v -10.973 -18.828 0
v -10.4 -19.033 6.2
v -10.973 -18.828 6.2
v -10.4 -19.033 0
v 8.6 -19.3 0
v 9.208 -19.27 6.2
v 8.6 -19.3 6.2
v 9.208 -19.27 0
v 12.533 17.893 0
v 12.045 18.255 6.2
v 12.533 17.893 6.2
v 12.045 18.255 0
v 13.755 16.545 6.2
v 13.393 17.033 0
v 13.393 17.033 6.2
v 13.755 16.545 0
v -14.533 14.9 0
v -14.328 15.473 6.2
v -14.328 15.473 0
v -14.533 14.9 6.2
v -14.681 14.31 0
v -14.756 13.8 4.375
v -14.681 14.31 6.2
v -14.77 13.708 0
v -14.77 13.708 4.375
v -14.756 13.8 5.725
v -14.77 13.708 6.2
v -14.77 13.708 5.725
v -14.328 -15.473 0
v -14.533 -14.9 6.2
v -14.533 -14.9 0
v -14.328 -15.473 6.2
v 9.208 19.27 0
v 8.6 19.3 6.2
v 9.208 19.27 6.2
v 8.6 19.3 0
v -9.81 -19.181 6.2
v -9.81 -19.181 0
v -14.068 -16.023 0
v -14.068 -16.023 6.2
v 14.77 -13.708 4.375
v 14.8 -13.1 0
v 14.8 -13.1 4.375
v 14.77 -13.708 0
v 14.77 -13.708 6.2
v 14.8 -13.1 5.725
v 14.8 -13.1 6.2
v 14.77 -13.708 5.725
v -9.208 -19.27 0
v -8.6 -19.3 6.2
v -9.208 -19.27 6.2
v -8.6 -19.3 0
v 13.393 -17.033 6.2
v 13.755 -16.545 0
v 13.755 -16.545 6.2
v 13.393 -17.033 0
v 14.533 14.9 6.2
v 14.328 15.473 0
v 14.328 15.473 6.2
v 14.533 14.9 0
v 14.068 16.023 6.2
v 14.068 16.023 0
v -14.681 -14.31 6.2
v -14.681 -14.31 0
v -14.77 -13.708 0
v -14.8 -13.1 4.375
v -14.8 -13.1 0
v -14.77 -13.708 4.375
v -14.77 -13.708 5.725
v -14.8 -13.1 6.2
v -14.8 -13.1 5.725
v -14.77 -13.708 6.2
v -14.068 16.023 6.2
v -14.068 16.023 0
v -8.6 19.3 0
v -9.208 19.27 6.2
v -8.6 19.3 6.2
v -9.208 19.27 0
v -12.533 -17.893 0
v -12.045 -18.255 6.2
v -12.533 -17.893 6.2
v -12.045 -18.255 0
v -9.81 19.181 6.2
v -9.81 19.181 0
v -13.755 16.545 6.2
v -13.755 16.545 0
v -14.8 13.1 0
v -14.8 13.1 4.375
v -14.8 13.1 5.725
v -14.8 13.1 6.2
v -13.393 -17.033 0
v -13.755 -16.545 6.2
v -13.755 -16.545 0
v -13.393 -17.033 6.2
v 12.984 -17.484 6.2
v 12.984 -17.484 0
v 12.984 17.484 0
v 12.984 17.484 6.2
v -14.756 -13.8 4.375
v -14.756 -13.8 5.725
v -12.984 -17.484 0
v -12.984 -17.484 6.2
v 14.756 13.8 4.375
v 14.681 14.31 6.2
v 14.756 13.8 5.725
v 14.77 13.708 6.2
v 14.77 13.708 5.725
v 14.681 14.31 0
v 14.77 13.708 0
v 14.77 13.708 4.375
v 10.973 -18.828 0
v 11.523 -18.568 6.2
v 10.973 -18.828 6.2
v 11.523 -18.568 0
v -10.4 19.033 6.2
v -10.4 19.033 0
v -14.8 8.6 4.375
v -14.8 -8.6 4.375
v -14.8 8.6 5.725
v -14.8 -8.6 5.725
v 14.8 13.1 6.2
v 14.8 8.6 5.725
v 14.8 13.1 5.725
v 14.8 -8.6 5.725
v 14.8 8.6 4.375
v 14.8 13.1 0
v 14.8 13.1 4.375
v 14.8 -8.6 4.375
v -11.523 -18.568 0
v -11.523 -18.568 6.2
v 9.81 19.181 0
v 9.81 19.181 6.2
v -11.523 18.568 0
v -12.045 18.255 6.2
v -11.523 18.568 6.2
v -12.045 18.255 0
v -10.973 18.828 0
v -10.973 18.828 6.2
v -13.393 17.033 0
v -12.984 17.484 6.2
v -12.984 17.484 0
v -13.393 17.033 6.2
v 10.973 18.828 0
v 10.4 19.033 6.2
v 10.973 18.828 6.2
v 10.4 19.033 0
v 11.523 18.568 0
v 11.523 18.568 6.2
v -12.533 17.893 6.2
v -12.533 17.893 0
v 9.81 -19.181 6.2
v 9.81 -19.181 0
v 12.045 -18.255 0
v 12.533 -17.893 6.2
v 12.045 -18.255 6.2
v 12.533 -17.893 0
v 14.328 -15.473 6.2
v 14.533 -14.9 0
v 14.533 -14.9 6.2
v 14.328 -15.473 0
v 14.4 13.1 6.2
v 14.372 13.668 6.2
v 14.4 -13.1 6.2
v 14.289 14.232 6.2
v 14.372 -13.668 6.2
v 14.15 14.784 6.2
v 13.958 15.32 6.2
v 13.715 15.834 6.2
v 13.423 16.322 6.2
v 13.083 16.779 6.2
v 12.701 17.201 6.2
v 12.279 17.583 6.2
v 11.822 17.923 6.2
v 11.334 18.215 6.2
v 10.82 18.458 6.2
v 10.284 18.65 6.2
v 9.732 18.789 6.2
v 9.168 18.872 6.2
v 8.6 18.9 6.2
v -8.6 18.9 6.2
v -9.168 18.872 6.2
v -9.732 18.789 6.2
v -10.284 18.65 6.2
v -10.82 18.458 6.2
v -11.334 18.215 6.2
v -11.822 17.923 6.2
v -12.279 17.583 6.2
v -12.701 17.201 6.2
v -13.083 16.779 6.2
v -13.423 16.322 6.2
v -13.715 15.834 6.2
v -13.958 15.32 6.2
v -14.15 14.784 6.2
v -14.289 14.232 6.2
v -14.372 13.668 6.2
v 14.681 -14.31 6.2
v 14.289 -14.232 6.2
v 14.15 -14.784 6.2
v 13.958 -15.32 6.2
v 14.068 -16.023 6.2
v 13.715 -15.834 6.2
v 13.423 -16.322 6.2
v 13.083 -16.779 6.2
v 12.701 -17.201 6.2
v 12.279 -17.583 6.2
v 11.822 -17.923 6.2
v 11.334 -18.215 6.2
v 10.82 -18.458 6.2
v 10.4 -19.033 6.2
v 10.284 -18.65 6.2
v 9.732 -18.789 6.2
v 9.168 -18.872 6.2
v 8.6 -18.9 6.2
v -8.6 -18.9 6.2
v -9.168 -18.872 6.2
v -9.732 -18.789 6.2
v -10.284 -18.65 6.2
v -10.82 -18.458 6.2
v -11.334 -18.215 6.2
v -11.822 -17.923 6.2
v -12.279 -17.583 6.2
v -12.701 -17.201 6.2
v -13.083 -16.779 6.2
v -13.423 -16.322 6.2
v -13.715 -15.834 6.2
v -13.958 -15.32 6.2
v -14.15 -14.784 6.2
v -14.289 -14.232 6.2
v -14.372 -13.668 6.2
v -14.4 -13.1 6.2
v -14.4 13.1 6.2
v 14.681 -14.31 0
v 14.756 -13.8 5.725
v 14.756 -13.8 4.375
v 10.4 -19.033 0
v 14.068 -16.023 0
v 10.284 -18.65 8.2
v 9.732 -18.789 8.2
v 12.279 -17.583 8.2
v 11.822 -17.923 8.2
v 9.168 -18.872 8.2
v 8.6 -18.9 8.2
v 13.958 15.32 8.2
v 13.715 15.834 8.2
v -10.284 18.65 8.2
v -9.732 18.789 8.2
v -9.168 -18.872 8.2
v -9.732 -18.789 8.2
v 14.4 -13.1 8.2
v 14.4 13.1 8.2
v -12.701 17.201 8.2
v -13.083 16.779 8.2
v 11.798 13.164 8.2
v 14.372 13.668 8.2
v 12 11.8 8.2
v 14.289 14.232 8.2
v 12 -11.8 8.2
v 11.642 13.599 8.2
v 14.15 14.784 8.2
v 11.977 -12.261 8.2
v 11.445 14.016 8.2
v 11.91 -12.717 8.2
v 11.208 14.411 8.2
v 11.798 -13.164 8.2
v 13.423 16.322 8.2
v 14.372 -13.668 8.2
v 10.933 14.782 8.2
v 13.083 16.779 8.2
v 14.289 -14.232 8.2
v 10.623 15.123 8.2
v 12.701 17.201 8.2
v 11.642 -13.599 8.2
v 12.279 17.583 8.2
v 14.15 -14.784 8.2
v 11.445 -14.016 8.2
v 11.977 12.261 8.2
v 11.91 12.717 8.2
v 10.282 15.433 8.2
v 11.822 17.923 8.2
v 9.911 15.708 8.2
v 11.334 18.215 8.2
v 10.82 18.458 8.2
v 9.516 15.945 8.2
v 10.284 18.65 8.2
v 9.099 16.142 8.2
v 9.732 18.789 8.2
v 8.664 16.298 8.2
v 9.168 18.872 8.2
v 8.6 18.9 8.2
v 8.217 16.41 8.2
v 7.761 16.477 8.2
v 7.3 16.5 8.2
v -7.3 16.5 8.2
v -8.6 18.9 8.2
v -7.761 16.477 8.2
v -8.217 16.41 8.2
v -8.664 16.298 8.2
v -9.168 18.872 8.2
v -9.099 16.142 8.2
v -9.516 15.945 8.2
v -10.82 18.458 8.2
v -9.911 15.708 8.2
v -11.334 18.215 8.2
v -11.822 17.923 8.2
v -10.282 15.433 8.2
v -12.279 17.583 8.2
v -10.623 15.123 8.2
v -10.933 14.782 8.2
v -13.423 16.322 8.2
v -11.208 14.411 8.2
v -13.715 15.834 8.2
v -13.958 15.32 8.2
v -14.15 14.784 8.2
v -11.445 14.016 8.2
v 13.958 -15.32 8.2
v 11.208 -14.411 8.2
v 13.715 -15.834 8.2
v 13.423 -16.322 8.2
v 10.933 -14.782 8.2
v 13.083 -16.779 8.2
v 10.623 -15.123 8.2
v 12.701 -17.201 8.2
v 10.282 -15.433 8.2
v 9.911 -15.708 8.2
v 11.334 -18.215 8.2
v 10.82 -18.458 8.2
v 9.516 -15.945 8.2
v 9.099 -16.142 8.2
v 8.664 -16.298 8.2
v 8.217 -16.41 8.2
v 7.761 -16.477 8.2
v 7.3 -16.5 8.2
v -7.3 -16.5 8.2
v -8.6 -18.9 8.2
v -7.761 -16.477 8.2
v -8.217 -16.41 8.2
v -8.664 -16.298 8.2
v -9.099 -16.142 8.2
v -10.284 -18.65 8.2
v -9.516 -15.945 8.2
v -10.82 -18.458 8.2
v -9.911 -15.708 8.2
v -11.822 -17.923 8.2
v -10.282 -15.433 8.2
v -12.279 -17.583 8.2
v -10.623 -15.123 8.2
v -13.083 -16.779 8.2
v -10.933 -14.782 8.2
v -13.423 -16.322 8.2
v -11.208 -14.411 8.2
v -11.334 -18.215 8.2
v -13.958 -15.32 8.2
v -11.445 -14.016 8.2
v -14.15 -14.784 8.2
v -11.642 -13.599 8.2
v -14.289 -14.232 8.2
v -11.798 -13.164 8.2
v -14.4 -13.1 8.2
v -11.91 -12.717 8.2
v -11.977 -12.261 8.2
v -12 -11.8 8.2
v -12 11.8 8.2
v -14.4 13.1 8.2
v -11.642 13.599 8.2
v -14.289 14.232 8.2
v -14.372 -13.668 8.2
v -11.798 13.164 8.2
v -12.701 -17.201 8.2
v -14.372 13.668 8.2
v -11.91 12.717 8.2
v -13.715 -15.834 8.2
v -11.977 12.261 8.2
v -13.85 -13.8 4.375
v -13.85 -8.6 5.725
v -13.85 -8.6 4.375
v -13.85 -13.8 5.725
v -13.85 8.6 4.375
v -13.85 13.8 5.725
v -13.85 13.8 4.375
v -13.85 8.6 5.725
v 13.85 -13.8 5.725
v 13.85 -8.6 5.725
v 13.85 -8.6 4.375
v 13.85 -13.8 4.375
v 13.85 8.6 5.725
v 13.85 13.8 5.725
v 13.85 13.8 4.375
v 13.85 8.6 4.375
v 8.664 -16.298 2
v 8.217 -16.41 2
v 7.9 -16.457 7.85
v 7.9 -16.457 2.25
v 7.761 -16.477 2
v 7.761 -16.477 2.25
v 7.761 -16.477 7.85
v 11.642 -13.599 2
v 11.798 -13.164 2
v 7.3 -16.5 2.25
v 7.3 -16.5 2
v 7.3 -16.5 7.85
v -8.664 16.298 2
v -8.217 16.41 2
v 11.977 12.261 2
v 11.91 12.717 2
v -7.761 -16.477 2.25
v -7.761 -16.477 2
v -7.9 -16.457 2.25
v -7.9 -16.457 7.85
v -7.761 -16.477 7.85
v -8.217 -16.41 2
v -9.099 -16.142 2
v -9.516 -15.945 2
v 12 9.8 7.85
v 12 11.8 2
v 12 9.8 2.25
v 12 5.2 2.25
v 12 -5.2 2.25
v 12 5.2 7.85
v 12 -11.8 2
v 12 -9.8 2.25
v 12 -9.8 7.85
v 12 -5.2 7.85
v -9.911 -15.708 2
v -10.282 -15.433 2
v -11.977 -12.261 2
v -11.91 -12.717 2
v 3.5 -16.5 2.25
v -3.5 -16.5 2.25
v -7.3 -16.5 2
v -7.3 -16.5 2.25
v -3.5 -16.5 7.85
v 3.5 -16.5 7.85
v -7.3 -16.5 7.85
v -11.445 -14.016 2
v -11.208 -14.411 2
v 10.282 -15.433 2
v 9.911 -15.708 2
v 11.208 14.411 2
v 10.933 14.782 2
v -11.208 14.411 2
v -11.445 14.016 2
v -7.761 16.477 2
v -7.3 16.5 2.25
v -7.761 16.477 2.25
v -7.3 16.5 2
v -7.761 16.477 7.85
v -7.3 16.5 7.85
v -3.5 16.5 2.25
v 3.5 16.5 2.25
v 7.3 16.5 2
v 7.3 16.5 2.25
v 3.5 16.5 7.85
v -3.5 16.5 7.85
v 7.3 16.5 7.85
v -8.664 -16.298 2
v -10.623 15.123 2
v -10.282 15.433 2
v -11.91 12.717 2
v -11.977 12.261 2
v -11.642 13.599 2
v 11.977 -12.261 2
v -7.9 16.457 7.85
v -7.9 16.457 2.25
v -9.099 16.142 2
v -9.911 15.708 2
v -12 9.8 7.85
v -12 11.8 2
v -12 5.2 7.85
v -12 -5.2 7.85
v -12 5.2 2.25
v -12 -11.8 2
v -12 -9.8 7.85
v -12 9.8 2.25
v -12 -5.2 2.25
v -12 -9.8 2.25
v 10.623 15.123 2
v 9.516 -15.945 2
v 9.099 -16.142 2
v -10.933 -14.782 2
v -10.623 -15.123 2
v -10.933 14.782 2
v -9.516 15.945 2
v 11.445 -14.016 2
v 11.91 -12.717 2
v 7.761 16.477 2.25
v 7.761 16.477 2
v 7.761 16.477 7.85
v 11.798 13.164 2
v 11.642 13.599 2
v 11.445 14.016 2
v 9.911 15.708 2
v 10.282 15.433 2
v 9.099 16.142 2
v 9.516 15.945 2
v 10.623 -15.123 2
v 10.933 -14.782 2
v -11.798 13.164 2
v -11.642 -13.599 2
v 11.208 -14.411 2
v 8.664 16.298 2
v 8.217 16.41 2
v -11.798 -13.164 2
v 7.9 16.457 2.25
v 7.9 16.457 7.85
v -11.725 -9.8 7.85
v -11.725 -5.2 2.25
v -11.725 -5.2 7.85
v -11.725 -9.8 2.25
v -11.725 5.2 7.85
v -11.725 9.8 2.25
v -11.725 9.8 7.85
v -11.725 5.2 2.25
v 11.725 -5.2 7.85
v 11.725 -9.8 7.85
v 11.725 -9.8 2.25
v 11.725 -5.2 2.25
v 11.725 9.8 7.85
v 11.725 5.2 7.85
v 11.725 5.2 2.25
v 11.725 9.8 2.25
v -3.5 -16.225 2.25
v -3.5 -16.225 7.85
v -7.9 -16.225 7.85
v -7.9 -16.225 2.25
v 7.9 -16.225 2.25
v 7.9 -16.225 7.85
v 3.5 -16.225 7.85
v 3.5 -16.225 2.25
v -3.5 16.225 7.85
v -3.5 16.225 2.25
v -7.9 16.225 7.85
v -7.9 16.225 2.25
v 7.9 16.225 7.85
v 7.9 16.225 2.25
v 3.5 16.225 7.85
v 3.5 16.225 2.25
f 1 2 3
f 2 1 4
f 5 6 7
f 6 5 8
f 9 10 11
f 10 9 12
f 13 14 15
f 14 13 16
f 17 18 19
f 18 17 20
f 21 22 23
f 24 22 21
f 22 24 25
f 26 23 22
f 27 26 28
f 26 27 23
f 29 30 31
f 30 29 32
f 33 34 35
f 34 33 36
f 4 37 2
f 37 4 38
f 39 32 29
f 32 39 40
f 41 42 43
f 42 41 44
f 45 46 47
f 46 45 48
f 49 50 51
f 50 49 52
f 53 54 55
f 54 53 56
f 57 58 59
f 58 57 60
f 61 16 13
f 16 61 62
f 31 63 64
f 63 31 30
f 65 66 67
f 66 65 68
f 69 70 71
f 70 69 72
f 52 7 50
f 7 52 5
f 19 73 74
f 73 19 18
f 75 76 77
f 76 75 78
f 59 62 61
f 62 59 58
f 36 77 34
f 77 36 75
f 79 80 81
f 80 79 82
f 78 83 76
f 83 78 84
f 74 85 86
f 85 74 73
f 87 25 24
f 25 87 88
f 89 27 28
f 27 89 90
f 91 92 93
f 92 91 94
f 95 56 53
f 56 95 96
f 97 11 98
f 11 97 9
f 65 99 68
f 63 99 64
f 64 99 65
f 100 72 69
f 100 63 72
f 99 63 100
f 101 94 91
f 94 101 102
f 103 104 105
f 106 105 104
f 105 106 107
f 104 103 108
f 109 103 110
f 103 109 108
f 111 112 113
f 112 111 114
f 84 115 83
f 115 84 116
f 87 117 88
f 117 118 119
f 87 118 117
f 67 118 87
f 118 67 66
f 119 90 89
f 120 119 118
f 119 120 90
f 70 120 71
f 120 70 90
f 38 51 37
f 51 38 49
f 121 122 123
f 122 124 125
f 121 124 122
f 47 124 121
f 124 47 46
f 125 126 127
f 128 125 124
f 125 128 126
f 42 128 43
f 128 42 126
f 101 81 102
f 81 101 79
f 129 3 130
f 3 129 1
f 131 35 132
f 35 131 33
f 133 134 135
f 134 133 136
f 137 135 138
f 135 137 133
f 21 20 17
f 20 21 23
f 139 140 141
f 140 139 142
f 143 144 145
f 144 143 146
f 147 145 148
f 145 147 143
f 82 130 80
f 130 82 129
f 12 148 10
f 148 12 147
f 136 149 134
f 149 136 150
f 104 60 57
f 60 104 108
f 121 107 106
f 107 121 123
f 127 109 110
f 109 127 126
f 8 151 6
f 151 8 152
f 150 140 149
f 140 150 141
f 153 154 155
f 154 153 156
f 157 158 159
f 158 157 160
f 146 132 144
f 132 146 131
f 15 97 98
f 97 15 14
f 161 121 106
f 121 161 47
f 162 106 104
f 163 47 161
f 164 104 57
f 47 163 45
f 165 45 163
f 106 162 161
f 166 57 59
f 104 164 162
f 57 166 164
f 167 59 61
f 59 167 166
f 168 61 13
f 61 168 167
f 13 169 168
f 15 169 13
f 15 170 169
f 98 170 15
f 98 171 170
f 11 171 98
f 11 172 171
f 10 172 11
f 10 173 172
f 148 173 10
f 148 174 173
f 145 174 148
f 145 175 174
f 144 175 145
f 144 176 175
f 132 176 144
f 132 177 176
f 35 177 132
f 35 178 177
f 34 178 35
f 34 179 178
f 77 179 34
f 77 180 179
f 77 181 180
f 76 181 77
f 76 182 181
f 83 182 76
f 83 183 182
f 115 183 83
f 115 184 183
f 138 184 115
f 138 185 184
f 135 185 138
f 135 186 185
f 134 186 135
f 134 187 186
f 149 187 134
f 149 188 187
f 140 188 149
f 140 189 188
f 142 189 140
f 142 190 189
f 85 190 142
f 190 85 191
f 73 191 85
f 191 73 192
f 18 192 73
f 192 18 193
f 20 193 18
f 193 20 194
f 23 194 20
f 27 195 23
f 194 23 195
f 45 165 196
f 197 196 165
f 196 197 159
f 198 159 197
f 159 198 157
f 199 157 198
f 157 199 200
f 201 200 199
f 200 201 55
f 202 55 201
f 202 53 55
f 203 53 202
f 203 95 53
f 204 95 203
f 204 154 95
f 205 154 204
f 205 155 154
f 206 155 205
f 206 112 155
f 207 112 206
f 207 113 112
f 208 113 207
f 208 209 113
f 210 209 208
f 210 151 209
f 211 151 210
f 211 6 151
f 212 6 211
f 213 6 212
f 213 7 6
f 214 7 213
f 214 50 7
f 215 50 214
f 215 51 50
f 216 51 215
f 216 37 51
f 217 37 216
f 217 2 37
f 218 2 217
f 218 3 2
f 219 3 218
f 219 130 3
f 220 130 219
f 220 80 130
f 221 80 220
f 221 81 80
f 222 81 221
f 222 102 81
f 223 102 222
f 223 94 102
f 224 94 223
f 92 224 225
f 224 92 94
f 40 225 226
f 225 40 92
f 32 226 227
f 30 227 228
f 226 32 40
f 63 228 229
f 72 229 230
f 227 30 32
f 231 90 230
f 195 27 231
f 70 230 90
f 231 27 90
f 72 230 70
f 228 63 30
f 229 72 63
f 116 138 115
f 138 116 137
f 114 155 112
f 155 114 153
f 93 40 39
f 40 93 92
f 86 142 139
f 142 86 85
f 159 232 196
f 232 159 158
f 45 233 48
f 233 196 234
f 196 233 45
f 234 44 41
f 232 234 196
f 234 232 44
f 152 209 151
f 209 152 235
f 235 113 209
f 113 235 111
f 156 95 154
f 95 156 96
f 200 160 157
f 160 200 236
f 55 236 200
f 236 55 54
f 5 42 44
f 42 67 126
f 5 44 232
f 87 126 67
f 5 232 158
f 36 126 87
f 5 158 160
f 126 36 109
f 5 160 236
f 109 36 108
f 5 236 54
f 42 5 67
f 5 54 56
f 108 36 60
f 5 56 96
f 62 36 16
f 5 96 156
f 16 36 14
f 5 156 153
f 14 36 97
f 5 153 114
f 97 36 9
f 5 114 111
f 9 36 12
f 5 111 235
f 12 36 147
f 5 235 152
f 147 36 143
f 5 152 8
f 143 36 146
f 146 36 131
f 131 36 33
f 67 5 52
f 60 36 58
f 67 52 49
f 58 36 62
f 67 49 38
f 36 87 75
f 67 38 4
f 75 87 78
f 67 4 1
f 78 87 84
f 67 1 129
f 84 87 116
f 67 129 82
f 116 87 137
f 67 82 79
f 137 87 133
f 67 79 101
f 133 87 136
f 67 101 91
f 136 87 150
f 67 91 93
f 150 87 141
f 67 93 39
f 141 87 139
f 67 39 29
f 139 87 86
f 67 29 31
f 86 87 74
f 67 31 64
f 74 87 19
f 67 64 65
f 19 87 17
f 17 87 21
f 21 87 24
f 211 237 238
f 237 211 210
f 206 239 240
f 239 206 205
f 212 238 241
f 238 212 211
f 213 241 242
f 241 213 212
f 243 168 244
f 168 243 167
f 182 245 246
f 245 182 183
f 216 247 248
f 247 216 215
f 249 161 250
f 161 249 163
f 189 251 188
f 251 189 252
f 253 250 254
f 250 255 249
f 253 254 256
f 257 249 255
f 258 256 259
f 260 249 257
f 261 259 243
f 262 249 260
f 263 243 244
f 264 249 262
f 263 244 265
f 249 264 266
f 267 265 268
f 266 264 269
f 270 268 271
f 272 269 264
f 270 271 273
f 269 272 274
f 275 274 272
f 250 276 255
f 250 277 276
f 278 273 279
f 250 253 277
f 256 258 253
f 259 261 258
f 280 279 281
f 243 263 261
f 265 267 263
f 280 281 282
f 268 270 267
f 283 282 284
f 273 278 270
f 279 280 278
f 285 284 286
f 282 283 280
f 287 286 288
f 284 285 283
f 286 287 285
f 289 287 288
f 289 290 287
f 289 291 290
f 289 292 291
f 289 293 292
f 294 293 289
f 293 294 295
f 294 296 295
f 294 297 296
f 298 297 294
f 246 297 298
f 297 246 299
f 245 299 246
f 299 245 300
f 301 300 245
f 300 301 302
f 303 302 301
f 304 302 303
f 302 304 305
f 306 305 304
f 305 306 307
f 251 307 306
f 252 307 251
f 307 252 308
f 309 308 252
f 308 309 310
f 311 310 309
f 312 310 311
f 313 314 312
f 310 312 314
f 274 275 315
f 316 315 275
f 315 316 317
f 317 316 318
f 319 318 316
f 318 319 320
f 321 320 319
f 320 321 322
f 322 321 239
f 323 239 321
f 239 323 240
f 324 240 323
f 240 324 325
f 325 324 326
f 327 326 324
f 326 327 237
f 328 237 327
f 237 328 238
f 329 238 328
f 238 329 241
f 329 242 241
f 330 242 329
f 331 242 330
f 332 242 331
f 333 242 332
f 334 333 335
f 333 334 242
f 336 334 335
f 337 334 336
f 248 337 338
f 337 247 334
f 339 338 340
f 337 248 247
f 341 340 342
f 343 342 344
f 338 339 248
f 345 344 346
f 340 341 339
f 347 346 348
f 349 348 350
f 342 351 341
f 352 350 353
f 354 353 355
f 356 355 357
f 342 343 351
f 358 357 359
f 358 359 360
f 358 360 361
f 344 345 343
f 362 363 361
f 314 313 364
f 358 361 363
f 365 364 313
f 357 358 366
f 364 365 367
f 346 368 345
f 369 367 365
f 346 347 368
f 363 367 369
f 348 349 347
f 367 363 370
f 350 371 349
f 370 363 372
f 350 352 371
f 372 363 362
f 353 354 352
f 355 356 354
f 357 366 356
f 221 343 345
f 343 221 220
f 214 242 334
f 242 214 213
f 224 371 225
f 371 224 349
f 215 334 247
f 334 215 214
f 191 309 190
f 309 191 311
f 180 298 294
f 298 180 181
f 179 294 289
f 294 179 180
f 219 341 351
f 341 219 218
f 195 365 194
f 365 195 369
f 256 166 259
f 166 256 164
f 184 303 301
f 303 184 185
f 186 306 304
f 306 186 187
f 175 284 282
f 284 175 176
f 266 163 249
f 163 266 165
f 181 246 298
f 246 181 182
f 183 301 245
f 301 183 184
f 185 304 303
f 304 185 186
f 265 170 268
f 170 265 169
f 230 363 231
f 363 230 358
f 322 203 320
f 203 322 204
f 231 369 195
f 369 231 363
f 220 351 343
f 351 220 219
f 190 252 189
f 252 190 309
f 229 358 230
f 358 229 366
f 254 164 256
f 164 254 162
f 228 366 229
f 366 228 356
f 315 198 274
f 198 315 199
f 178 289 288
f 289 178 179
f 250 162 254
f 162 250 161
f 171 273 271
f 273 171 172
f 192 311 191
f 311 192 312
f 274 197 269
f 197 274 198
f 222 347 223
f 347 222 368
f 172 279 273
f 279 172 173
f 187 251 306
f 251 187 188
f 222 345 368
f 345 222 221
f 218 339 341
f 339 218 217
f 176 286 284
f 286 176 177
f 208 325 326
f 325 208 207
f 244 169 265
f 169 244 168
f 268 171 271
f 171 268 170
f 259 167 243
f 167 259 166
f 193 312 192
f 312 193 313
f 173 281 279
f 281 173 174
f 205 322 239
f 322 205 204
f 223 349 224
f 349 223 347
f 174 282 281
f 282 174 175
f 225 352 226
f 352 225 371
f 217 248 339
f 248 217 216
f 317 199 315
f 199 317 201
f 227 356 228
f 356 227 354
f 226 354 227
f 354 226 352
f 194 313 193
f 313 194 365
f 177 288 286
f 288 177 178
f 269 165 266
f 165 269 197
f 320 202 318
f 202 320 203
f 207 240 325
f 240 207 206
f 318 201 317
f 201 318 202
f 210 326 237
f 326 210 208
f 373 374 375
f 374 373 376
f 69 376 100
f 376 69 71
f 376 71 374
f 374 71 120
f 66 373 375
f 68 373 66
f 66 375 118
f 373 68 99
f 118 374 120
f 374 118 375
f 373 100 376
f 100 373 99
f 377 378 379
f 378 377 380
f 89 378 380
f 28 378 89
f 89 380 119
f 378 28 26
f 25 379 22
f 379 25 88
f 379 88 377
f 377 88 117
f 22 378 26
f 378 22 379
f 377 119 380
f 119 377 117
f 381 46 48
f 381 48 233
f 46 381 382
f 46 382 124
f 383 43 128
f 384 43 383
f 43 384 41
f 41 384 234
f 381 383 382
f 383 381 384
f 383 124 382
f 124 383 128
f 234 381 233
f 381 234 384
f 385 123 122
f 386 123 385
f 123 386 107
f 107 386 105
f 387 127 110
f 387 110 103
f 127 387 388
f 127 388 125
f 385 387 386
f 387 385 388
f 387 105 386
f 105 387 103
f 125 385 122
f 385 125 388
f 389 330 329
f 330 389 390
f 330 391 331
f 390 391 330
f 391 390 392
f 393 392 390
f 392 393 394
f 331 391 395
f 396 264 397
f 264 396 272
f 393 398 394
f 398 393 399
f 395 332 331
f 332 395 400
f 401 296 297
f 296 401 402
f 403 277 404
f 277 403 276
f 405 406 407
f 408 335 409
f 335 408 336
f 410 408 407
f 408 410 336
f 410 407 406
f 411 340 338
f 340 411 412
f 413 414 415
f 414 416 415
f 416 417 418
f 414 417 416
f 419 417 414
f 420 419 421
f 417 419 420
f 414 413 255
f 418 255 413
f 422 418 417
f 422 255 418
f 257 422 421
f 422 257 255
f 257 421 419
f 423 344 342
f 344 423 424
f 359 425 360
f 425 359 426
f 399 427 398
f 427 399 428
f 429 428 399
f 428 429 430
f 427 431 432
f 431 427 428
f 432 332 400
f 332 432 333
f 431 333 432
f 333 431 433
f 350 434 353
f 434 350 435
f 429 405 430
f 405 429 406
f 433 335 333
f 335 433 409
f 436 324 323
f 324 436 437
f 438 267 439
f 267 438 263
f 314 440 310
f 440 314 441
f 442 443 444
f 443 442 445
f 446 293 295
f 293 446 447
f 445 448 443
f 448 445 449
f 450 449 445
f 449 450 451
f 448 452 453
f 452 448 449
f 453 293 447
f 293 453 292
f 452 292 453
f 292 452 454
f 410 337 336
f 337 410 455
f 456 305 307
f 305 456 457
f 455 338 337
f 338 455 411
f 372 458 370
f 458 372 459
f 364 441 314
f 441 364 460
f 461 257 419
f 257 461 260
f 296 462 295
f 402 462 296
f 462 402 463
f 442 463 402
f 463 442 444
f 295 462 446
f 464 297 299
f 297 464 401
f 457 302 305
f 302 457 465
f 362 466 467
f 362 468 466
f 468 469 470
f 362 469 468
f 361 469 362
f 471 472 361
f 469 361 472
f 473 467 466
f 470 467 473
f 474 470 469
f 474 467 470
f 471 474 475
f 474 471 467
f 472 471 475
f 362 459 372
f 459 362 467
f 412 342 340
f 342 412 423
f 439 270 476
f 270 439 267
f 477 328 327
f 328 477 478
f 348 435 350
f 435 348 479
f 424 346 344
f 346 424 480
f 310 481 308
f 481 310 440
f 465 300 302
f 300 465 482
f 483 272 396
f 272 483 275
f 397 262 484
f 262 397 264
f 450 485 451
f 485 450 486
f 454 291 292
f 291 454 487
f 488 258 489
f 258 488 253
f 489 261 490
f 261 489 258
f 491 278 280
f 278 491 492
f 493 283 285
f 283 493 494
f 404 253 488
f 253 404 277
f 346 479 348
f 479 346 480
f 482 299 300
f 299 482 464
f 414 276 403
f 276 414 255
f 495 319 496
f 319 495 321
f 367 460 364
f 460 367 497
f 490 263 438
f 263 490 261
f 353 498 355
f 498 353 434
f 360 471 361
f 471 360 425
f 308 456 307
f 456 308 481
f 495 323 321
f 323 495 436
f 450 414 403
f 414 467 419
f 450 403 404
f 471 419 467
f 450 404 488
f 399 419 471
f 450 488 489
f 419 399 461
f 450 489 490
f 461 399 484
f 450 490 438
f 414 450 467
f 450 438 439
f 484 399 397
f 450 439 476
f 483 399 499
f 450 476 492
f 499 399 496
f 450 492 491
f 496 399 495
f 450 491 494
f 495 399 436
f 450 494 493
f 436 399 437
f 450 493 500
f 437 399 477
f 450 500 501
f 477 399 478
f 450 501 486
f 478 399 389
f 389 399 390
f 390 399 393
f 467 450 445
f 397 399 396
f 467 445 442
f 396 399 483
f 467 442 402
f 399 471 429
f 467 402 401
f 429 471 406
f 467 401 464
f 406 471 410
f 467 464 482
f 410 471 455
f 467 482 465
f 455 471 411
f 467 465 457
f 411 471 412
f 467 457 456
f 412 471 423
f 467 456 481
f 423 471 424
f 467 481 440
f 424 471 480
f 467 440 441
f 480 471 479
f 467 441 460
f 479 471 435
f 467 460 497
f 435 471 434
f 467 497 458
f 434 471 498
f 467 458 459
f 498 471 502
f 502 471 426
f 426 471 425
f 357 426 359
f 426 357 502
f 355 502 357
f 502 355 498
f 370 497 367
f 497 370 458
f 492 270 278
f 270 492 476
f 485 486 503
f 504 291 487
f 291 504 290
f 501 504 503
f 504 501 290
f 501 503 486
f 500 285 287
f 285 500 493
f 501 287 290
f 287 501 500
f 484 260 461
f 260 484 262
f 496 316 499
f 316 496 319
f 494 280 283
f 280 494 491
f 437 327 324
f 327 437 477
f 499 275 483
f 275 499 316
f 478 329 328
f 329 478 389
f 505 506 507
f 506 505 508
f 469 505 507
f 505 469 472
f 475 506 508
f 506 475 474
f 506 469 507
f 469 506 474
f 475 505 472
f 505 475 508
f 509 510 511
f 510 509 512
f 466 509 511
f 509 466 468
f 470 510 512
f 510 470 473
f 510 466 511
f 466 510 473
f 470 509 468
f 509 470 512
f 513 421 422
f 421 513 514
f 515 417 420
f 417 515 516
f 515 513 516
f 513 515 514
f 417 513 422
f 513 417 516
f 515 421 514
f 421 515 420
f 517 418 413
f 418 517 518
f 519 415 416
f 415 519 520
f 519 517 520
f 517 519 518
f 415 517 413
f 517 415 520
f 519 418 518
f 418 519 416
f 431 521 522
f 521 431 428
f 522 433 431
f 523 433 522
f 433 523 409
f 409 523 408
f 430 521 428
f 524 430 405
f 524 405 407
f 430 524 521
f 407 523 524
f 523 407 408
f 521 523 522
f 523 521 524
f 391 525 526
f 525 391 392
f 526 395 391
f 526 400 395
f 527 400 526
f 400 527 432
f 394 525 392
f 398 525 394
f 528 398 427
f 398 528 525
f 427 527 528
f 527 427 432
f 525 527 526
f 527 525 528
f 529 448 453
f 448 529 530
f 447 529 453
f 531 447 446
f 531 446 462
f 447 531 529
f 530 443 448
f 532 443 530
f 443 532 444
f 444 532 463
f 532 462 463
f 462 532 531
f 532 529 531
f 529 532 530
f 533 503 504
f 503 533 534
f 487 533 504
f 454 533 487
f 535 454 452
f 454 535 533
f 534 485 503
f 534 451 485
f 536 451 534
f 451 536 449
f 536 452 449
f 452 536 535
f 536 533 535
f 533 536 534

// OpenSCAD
// WT9011DCL-BT50 rehabilitation wearable enclosure + strap holder
// Units: mm
// Designed from WT9011DCL-BT50 nominal size 23.5 x 32.5 x 11.4 mm.
// Coordinate convention: X = short side, Y = long side; Type-C is on -Y face.
$fn = 64;

PART = "bottom"; // bottom | lid | holder | assembly

// --- Sensor nominal dimensions ---
sensor_x = 23.5;
sensor_y = 32.5;
sensor_z = 11.4;

// --- Enclosure parameters ---
case_x = 29.6;
case_y = 38.6;
corner_r = 6.2;
neck_x = 28.8;
neck_y = 37.8;
neck_r = 5.8;

bottom_h = 8.2;
main_h = 6.2;
floor_t = 2.0;

cavity_bottom_x = 24.0; // 0.25 mm clearance per X side before grip ribs
cavity_bottom_y = 33.0; // 0.25 mm clearance per Y side before grip ribs
cavity_r = 4.7;

lid_h = 9.2;
lid_top_t = 1.8;
lid_overlap_h = 2.2;
lid_overlap_x = 29.2;
lid_overlap_y = 38.2;
lid_overlap_r = 5.95;
lid_cavity_x = 24.2;
lid_cavity_y = 33.2;

// Port / control locations, referenced to sensor center
button_x = 0;
button_y = -3.2;
button_hole_d_inner = 9.4;
button_hole_d_top = 11.2;
led_x = 7.0;
led_y = -7.3;
led_hole_d = 3.8;
port_w = 12.0;
port_h = 6.2;
port_r = 1.6;

// Holder parameters
holder_x = 46.0;
holder_y = 41.0;
holder_r = 5.0;
holder_t = 2.4;
strap_slot_w = 5.5;
strap_slot_len = 27.0;
strap_slot_r = 2.3;
strap_slot_x = 19.0;
clip_y = 11.2;
clip_len_y = 5.6;
clip_wall_t = 1.55;
clip_h = 6.9;
clip_hook_depth = 0.85;
clip_hook_z0 = 4.95;
clip_hook_h = 1.15;

// Helper: 2D rounded rectangle centered on origin
module rounded_rect_2d(w, h, r) {
    offset(r=r) square([w-2*r, h-2*r], center=true);
}

module rounded_prism(w, h, z, r) {
    linear_extrude(height=z)
        rounded_rect_2d(w,h,r);
}

module rounded_slot_2d(w, h, r) {
    rounded_rect_2d(w,h,min(r,min(w,h)/2-0.01));
}

// Side opening on -Y face. The 2D geometry is X-Z, extruded through Y.
module side_rounded_opening(width, height, radius, zc, y_start=-50, depth=100) {
    translate([0, y_start, zc])
        rotate([90,0,0])
            linear_extrude(height=depth)
                rounded_slot_2d(width,height,radius);
}

// Side latch pocket on +/-X faces of lower case, centered at y.
module latch_pockets() {
    pocket_depth = 0.9;
    pocket_y = 5.2;
    pocket_z = 1.35;
    zc = 5.05;
    for (sx=[-1,1], yy=[-clip_y,clip_y]) {
        translate([sx*(case_x/2-pocket_depth/2+0.05), yy, zc])
            cube([pocket_depth+0.2,pocket_y,pocket_z],center=true);
    }
}

module bottom_case() {
    difference() {
        union() {
            // Flush lower body
            rounded_prism(case_x,case_y,main_h,corner_r);
            // Smaller neck captured by cap lid
            translate([0,0,main_h])
                rounded_prism(neck_x,neck_y,bottom_h-main_h,neck_r);
        }
        // Sensor cavity through the tray upper region
        translate([0,0,floor_t])
            rounded_prism(cavity_bottom_x,cavity_bottom_y,bottom_h-floor_t+0.3,cavity_r);
        // Type-C opening: lower half of assembled opening
        side_rounded_opening(port_w,3.7,1.3,6.35,-case_y/2-1,6);
        // Holder latch pockets
        latch_pockets();
    }

    // Anti-rattle grip ribs: 0.10 mm intrusion beyond nominal cavity walls.
    rib_in = 0.10;
    rib_t = 0.45;
    rib_z0 = floor_t+0.25;
    rib_h = 5.6;
    // X-side ribs (four)
    for (sx=[-1,1], yy=[-7.5,7.5]) {
        translate([sx*(cavity_bottom_x/2-rib_in/2),yy,rib_z0+rib_h/2])
            cube([rib_t,4.6,rib_h],center=true);
    }
    // Y-side ribs (four)
    for (sy=[-1,1], xx=[-5.7,5.7]) {
        translate([xx,sy*(cavity_bottom_y/2-rib_in/2),rib_z0+rib_h/2])
            cube([4.4,rib_t,rib_h],center=true);
    }
}

module lid_case() {
    difference() {
        rounded_prism(case_x,case_y,lid_h,corner_r);
        // Lower overlap cavity: slips over the bottom neck
        translate([0,0,-0.05])
            rounded_prism(lid_overlap_x,lid_overlap_y,lid_overlap_h+0.15,lid_overlap_r);
        // Upper sensor cavity, leaving lid top thickness
        translate([0,0,1.85])
            rounded_prism(lid_cavity_x,lid_cavity_y,lid_h-lid_top_t-1.85+0.05,cavity_r+0.1);
        // Type-C opening: upper half in cap (assembly global z = 6.2 + local z)
        side_rounded_opening(port_w,4.9,1.5,1.95,-case_y/2-1,6);
        // Button opening: tapered/countersunk for easy finger access
        translate([button_x,button_y,lid_h-lid_top_t-0.05])
            cylinder(h=lid_top_t+0.2,d1=button_hole_d_inner,d2=button_hole_d_top);
        // LED viewing opening
        translate([led_x,led_y,lid_h-lid_top_t-0.05])
            cylinder(h=lid_top_t+0.2,d=led_hole_d);
    }

    // Raised orientation arrow on top: points +Y (away from Type-C).
    translate([0,10.8,lid_h])
        linear_extrude(height=0.35)
            polygon(points=[[-2.6,-2.2],[2.6,-2.2],[0,2.5]]);
}

// Right-side flexible clip with inward hook; mirrored for left.
module one_clip(signx=1, yy=0) {
    x_inner = case_x/2 + 0.18;
    // clip wall outside the case
    x0 = signx>0 ? x_inner : -x_inner-clip_wall_t;
    translate([x0,yy-clip_len_y/2,holder_t])
        cube([clip_wall_t,clip_len_y,clip_h]);

    // Hook block into case latch pocket
    hook_x0 = signx>0 ? x_inner-clip_hook_depth : -x_inner;
    translate([hook_x0,yy-(clip_len_y-0.5)/2,holder_t+clip_hook_z0])
        cube([clip_hook_depth+(signx<0?0:0),clip_len_y-0.5,clip_hook_h]);

    // Lead-in ramp above hook for snap insertion
    // 2D X-Z triangular wedge extruded along Y.
    translate([0,yy-(clip_len_y-0.8)/2,0])
        rotate([90,0,0])
            linear_extrude(height=clip_len_y-0.8)
                polygon(points = signx>0 ?
                    [[x_inner,holder_t+clip_hook_z0+clip_hook_h],
                     [x_inner,holder_t+clip_h],
                     [x_inner-clip_hook_depth,holder_t+clip_hook_z0+clip_hook_h]] :
                    [[-x_inner,holder_t+clip_hook_z0+clip_hook_h],
                     [-x_inner,holder_t+clip_h],
                     [-x_inner+clip_hook_depth,holder_t+clip_hook_z0+clip_hook_h]]);
}

module strap_holder() {
    difference() {
        rounded_prism(holder_x,holder_y,holder_t,holder_r);
        // Two universal strap slots
        for (sx=[-1,1]) {
            translate([sx*strap_slot_x,0,-0.1])
                linear_extrude(height=holder_t+0.2)
                    rounded_slot_2d(strap_slot_w,strap_slot_len,strap_slot_r);
        }
        // Large center relief to reduce weight while preserving a support rim
        translate([0,0,-0.1])
            linear_extrude(height=holder_t+0.2)
                rounded_rect_2d(24.5,31.5,4.2);
    }

    // Four snap clips corresponding to four side latch pockets
    for (sx=[-1,1], yy=[-clip_y,clip_y])
        one_clip(sx,yy);

    // Four small support pads keep the enclosure plane stable above the relief.
    for (xx=[-9.8,9.8], yy=[-14.0,14.0])
        translate([xx,yy,holder_t]) cylinder(h=0.6,d=3.2);
}

module sensor_dummy() {
    color([0.1,0.1,0.1,0.8])
        translate([0,0,floor_t])
            rounded_prism(sensor_x,sensor_y,sensor_z,4.6);
}

module assembly() {
    color("beige") bottom_case();
    color("beige") translate([0,0,main_h]) lid_case();
    color("gray",0.55) sensor_dummy();
    color("beige") translate([0,0,-holder_t-0.6]) strap_holder();
}

if (PART=="bottom") bottom_case();
else if (PART=="lid") lid_case();
else if (PART=="holder") strap_holder();
else if (PART=="assembly") assembly();
